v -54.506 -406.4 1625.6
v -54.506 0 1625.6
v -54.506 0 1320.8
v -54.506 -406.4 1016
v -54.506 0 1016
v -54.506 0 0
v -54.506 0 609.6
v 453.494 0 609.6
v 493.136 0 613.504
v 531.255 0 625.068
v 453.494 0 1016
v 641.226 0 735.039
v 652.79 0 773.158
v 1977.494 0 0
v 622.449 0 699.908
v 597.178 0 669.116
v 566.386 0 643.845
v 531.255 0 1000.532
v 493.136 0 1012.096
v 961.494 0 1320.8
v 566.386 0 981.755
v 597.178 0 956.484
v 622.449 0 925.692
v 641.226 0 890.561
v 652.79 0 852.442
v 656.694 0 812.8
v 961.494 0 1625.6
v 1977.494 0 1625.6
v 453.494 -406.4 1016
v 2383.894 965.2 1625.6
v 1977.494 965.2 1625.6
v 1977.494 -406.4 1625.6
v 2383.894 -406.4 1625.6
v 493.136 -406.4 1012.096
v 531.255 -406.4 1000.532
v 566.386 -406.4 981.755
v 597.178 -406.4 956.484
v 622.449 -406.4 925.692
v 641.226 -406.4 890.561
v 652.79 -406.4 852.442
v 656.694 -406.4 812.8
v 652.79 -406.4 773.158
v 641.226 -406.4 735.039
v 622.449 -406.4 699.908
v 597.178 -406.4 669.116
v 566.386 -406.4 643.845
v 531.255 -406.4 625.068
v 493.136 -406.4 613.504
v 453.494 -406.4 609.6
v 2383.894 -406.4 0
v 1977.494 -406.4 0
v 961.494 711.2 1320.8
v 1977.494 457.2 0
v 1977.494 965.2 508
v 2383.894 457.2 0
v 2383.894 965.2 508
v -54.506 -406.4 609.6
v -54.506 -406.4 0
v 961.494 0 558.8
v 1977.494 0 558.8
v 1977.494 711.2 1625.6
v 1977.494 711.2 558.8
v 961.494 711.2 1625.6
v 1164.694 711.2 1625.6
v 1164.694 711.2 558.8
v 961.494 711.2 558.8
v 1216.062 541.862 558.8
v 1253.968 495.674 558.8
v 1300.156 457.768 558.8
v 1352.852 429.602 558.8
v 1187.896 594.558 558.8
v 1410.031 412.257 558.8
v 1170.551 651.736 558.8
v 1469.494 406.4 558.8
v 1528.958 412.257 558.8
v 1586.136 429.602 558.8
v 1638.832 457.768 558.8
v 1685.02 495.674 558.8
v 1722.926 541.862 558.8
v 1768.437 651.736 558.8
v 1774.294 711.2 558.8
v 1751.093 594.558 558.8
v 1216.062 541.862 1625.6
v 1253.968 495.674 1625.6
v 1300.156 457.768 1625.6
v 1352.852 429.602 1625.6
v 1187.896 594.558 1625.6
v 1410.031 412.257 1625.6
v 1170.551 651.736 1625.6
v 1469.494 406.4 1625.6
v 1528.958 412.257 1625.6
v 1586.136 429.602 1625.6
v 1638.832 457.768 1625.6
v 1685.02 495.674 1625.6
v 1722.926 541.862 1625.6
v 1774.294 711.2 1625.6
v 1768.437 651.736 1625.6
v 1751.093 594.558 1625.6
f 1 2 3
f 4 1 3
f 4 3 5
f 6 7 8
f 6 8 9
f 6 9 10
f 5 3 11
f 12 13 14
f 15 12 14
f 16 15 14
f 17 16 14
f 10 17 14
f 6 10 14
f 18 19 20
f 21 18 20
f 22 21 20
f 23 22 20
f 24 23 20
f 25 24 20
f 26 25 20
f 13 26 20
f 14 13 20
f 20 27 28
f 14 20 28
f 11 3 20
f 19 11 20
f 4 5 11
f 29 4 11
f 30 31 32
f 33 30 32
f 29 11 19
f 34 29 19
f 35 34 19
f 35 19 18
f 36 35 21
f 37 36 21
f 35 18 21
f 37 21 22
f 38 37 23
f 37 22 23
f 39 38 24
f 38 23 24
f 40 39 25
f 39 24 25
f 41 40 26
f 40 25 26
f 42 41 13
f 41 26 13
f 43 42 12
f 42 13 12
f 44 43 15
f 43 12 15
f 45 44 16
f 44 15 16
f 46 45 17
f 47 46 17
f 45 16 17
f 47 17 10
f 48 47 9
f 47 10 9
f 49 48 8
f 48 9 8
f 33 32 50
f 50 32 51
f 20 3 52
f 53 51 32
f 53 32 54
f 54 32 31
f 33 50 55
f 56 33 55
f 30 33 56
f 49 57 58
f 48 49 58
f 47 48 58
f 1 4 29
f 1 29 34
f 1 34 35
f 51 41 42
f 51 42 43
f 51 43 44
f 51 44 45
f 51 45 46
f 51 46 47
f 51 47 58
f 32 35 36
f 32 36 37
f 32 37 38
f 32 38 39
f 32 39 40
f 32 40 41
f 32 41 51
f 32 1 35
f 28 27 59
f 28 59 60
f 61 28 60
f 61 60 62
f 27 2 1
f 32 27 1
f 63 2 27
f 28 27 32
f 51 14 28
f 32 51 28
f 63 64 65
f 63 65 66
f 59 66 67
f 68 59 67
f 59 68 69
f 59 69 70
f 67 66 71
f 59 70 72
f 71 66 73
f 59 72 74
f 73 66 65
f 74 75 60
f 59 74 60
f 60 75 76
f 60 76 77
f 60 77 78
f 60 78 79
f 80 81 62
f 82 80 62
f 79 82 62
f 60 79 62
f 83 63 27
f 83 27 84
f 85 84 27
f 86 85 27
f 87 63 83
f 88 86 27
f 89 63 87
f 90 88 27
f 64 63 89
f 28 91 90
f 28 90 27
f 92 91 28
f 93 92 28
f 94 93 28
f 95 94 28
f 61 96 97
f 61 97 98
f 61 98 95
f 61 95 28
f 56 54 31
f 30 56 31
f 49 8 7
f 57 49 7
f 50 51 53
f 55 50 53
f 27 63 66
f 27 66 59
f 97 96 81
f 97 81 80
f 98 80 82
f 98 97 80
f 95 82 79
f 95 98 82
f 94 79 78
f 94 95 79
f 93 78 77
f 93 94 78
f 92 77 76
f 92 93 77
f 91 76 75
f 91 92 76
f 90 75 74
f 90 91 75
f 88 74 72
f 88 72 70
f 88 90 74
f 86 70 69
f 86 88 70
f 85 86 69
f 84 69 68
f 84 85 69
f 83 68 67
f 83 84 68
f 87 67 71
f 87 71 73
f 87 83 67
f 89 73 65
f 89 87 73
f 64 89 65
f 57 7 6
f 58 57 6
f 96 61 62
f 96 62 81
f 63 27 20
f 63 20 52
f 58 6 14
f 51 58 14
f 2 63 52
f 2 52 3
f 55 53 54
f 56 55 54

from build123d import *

# Parameters (mm, degrees)
F1_DEPTH = 406.4
F3_DEPTH = 304.8
F6_DEPTH = 1066.8
F7_DEPTH = 406.4


with BuildPart() as f1:
    # F0 (on Front) → F1 (new body)
    with BuildSketch(Plane.XZ):
        with BuildLine():
            Line((-54.5059, 0), (1977.4941, 0))
            Line((1977.4941, 0), (1977.4941, 1625.6))
            Line((1977.4941, 1625.6), (-54.5059, 1625.6))
            Line((-54.5059, 1625.6), (-54.5059, 1016))
            Line((-54.5059, 1016), (453.4941, 1016))
            ThreePointArc((453.4941, 1016), (656.6941, 812.8), (453.4941, 609.6))
            Line((453.4941, 609.6), (-54.5059, 609.6))
            Line((-54.5059, 609.6), (-54.5059, 0))
        make_face()
    extrude(amount=F1_DEPTH)

    # F2 (on face) → F3 (join)
    with BuildSketch(Plane.XY.offset(1625.6)):
        Polygon((961.4941, 711.2), (-54.5059, 0), (961.4941, 0), align=None)
    extrude(amount=-F3_DEPTH)


with BuildPart() as f6:
    # F5 (on face) → F6 (new body)
    with BuildSketch(Plane.XY.offset(1625.6)):
        with BuildLine():
            Line((1164.6941, 711.2), (961.4941, 711.2))
            Line((961.4941, 711.2), (961.4941, 0))
            Line((961.4941, 0), (1977.4941, 0))
            Line((1977.4941, 0), (1977.4941, 711.2))
            Line((1977.4941, 711.2), (1774.2941, 711.2))
            ThreePointArc((1774.2941, 711.2), (1469.4941, 406.4), (1164.6941, 711.2))
        make_face()
    extrude(amount=-F6_DEPTH)


with BuildPart() as f7:
    # F4 (on face) → F7 (new body)
    with BuildSketch(Plane.YZ.offset(1977.4941)):
        Polygon((965.2, 508), (965.2, 1625.6), (-406.4, 1625.6), (-406.4, 0), (457.2, 0), align=None)
    extrude(amount=F7_DEPTH)


solid = Compound([f1.part, f6.part, f7.part])
